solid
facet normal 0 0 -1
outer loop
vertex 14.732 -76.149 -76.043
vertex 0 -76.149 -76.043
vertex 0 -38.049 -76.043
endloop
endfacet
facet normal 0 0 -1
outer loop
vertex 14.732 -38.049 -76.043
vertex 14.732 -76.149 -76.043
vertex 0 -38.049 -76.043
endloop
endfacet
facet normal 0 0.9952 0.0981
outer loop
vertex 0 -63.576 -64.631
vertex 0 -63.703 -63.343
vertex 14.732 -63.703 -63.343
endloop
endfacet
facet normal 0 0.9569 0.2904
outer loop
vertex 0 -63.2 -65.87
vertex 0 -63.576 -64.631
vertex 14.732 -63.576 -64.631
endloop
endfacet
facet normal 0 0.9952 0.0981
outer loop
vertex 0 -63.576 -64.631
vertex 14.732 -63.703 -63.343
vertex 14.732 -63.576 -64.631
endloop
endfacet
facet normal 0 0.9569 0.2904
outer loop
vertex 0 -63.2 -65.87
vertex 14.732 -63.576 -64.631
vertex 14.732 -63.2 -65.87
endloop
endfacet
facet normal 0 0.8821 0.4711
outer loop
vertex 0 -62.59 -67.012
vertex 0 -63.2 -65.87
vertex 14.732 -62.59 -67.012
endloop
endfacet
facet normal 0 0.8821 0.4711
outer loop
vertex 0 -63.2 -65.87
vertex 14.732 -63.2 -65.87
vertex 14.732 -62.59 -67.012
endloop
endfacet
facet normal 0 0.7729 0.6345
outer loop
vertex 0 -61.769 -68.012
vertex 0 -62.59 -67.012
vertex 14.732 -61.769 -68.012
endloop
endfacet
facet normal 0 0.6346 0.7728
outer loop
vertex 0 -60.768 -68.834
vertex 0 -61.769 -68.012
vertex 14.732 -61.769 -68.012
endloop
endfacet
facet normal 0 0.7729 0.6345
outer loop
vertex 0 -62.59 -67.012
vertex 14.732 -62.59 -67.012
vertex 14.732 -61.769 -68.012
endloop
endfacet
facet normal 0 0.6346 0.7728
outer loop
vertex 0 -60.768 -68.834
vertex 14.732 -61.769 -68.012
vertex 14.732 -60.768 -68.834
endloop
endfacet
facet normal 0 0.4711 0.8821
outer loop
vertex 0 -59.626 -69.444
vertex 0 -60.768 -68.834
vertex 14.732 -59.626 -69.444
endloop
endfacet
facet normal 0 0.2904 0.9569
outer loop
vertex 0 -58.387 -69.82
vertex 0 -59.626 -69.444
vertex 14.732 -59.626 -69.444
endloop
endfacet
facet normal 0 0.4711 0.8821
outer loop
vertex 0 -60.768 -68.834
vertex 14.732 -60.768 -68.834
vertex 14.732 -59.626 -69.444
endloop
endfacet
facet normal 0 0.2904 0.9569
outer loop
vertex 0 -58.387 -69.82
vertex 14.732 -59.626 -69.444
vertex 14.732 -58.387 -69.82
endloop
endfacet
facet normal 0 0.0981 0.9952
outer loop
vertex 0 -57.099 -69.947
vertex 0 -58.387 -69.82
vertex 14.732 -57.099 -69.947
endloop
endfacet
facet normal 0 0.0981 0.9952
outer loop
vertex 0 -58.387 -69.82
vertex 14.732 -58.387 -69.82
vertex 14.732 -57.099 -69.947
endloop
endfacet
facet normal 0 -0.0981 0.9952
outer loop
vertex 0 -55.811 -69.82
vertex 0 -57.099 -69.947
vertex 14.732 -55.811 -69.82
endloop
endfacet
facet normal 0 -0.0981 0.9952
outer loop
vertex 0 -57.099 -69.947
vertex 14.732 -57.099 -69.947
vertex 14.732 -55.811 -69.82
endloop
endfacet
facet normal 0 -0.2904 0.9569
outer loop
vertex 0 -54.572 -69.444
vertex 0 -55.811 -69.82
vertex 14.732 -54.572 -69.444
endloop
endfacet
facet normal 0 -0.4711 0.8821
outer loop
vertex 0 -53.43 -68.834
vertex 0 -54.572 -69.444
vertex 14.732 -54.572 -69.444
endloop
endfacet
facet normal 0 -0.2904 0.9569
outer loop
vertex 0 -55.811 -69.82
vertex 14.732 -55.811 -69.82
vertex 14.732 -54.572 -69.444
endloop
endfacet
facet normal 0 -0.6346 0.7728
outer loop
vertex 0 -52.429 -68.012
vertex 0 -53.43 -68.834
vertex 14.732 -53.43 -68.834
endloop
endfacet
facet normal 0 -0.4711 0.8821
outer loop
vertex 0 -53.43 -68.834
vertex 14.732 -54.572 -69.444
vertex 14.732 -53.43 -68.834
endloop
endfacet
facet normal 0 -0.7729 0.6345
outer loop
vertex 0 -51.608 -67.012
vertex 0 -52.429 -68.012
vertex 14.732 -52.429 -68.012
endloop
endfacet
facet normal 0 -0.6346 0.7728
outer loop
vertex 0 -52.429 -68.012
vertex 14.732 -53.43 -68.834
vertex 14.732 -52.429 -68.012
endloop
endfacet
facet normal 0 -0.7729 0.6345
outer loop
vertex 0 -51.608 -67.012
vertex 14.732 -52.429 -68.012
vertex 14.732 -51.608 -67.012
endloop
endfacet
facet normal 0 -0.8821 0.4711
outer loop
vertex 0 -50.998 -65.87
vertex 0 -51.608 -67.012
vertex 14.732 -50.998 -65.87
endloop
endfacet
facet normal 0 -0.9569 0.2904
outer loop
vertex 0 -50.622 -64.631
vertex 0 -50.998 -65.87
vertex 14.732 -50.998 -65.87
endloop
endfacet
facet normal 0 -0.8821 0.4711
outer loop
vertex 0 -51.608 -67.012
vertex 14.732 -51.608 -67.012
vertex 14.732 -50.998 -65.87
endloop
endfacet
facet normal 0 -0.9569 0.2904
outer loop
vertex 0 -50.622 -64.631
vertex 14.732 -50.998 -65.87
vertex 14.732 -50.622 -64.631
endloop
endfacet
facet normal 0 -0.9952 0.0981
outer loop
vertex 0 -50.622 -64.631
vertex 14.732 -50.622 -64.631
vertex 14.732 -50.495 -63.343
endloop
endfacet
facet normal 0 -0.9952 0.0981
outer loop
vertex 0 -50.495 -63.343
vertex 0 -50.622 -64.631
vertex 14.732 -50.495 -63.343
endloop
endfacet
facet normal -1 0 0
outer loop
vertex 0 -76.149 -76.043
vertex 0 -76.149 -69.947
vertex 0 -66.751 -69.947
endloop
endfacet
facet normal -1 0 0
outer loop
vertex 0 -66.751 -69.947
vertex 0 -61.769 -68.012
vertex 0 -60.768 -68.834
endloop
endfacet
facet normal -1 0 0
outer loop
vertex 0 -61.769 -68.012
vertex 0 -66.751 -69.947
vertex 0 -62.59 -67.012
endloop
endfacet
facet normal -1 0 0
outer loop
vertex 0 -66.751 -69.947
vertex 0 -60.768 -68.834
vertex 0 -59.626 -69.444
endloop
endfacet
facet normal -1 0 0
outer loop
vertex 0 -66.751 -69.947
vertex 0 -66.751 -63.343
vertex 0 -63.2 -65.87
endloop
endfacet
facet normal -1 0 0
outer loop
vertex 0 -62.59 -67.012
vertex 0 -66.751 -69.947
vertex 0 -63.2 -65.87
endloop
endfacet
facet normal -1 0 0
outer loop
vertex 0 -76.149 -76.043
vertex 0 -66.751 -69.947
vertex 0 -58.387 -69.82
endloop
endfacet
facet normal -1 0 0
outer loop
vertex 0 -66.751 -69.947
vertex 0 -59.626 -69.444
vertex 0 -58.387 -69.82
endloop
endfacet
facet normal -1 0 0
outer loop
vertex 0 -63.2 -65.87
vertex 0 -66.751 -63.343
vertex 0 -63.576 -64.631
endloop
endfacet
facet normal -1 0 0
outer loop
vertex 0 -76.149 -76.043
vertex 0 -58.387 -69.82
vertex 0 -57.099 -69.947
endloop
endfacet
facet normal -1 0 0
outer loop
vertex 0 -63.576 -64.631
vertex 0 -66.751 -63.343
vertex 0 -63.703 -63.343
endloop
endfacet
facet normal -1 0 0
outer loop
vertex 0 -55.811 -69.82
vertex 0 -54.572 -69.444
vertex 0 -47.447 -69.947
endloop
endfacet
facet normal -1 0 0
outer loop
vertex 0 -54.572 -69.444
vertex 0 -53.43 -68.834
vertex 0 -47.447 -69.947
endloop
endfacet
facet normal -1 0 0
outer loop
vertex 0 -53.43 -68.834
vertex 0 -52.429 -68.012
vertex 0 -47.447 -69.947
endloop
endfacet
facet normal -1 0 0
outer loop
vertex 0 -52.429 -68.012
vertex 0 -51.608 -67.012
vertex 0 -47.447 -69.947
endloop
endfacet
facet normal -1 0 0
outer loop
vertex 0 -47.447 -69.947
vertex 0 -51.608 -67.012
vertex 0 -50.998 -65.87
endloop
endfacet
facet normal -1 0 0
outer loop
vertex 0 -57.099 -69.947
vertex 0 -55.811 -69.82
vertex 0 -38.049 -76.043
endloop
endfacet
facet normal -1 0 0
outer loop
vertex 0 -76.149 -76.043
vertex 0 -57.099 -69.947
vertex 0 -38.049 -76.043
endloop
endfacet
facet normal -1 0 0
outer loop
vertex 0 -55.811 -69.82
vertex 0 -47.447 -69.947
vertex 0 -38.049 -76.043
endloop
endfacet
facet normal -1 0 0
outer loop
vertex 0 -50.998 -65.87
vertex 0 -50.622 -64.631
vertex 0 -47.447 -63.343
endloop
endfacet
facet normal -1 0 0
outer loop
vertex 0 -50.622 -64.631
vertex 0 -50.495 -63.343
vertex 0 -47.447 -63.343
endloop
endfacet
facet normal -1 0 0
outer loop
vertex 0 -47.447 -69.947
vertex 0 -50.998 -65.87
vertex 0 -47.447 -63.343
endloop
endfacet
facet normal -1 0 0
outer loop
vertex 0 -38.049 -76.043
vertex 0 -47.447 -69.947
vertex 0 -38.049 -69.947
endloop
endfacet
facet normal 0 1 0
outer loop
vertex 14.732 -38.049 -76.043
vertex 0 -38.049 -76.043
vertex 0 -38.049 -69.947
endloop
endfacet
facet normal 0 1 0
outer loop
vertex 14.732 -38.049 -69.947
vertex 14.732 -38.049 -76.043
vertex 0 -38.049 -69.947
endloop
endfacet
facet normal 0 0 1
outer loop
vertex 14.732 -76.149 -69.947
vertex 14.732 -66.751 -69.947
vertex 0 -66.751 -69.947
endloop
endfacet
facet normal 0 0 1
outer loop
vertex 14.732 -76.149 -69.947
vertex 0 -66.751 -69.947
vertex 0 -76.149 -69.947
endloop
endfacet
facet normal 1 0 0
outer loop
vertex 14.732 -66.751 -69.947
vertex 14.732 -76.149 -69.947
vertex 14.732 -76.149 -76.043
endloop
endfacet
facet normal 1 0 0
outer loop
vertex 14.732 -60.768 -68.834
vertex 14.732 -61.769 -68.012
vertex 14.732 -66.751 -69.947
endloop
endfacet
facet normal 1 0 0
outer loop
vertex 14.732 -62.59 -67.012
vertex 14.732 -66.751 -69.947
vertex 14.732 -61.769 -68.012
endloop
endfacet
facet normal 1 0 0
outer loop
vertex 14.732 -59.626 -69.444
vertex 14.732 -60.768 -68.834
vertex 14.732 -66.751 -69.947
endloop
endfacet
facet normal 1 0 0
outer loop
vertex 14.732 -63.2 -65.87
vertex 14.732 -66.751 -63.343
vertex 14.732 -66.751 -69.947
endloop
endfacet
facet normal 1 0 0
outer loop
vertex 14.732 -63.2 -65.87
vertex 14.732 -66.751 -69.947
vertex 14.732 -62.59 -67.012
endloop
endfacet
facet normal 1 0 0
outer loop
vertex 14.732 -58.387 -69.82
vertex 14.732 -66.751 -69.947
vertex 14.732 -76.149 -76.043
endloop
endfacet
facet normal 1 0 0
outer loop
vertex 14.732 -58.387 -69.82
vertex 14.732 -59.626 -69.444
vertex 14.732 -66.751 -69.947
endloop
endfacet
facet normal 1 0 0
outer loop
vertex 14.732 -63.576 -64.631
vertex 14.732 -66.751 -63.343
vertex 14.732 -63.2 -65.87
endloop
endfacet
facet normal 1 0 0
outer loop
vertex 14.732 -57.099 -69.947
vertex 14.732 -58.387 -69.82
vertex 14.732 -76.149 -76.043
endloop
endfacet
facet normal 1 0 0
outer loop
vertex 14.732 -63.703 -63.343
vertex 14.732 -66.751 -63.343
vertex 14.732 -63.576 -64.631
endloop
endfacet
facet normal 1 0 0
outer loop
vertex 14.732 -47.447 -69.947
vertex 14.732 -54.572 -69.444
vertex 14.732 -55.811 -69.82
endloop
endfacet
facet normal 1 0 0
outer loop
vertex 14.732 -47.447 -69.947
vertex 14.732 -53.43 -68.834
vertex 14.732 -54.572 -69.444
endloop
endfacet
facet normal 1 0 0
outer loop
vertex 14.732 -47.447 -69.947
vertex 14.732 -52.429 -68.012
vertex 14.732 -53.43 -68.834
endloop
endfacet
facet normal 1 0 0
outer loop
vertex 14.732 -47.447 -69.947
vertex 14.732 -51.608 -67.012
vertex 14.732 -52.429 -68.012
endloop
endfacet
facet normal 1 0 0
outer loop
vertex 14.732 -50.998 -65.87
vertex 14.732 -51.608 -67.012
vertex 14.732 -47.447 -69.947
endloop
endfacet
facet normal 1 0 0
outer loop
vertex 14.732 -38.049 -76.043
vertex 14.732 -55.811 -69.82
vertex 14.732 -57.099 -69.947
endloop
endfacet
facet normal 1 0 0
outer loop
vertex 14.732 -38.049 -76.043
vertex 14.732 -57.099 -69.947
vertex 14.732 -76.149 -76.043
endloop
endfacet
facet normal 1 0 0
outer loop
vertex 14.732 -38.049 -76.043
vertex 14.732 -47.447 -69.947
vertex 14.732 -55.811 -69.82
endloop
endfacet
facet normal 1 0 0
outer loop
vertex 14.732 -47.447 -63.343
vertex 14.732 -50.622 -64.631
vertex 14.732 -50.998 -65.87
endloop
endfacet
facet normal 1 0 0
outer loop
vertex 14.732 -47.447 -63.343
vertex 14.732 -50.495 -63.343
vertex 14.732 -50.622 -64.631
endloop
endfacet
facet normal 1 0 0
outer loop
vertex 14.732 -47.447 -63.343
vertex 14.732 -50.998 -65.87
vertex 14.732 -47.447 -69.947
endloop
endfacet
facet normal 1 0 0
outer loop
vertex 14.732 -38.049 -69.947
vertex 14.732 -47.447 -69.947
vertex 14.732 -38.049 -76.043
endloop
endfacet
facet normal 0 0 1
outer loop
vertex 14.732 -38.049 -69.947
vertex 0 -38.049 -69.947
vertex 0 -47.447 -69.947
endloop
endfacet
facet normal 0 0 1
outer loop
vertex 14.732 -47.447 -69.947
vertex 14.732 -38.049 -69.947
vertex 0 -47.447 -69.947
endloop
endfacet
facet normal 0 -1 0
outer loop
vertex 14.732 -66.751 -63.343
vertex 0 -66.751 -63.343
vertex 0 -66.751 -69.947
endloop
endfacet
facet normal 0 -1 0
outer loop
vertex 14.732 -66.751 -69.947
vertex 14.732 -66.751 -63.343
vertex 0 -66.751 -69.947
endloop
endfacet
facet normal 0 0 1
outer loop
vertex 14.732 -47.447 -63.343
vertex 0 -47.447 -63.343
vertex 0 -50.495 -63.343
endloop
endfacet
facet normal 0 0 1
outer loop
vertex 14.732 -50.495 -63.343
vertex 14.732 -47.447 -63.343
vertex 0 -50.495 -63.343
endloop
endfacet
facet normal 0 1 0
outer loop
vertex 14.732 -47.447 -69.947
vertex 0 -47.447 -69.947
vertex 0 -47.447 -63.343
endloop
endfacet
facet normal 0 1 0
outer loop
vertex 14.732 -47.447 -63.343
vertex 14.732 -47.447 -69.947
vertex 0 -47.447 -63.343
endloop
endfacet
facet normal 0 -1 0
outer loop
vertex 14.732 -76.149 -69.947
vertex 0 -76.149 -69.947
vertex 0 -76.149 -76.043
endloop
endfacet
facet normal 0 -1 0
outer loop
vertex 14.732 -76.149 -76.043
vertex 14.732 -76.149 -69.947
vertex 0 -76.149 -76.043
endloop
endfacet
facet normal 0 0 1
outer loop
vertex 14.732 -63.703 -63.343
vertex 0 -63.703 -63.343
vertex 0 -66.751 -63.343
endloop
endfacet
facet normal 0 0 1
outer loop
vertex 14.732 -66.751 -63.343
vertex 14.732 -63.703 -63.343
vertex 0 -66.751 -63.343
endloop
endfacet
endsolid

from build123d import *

# Parameters (mm, degrees)
F1_DEPTH = 14.732
F3_DEPTH = 14.733


with BuildPart() as f1:
    # F0 (on Right) → F1 (new body)
    with BuildSketch(Plane.YZ):
        Polygon((-76.149119, -69.946595), (-76.149119, -76.042595), (-38.049119, -76.042595), (-38.049119, -69.946595), (-47.447119, -69.946595), (-47.447119, -63.342595), (-66.751119, -63.342595), (-66.751119, -69.946595), align=None)
    extrude(amount=F1_DEPTH)

    # F2 (on face) → F3 (cut, through all)
    with BuildSketch(Plane.YZ.offset(14.732)):
        with BuildLine():
            ThreePointArc((-63.703119, -63.342595), (-57.099119, -69.946595), (-50.495119, -63.342595))
            Line((-50.495119, -63.342595), (-63.703119, -63.342595))
        make_face()
    extrude(amount=-F3_DEPTH, mode=Mode.SUBTRACT)


solid = f1.part
